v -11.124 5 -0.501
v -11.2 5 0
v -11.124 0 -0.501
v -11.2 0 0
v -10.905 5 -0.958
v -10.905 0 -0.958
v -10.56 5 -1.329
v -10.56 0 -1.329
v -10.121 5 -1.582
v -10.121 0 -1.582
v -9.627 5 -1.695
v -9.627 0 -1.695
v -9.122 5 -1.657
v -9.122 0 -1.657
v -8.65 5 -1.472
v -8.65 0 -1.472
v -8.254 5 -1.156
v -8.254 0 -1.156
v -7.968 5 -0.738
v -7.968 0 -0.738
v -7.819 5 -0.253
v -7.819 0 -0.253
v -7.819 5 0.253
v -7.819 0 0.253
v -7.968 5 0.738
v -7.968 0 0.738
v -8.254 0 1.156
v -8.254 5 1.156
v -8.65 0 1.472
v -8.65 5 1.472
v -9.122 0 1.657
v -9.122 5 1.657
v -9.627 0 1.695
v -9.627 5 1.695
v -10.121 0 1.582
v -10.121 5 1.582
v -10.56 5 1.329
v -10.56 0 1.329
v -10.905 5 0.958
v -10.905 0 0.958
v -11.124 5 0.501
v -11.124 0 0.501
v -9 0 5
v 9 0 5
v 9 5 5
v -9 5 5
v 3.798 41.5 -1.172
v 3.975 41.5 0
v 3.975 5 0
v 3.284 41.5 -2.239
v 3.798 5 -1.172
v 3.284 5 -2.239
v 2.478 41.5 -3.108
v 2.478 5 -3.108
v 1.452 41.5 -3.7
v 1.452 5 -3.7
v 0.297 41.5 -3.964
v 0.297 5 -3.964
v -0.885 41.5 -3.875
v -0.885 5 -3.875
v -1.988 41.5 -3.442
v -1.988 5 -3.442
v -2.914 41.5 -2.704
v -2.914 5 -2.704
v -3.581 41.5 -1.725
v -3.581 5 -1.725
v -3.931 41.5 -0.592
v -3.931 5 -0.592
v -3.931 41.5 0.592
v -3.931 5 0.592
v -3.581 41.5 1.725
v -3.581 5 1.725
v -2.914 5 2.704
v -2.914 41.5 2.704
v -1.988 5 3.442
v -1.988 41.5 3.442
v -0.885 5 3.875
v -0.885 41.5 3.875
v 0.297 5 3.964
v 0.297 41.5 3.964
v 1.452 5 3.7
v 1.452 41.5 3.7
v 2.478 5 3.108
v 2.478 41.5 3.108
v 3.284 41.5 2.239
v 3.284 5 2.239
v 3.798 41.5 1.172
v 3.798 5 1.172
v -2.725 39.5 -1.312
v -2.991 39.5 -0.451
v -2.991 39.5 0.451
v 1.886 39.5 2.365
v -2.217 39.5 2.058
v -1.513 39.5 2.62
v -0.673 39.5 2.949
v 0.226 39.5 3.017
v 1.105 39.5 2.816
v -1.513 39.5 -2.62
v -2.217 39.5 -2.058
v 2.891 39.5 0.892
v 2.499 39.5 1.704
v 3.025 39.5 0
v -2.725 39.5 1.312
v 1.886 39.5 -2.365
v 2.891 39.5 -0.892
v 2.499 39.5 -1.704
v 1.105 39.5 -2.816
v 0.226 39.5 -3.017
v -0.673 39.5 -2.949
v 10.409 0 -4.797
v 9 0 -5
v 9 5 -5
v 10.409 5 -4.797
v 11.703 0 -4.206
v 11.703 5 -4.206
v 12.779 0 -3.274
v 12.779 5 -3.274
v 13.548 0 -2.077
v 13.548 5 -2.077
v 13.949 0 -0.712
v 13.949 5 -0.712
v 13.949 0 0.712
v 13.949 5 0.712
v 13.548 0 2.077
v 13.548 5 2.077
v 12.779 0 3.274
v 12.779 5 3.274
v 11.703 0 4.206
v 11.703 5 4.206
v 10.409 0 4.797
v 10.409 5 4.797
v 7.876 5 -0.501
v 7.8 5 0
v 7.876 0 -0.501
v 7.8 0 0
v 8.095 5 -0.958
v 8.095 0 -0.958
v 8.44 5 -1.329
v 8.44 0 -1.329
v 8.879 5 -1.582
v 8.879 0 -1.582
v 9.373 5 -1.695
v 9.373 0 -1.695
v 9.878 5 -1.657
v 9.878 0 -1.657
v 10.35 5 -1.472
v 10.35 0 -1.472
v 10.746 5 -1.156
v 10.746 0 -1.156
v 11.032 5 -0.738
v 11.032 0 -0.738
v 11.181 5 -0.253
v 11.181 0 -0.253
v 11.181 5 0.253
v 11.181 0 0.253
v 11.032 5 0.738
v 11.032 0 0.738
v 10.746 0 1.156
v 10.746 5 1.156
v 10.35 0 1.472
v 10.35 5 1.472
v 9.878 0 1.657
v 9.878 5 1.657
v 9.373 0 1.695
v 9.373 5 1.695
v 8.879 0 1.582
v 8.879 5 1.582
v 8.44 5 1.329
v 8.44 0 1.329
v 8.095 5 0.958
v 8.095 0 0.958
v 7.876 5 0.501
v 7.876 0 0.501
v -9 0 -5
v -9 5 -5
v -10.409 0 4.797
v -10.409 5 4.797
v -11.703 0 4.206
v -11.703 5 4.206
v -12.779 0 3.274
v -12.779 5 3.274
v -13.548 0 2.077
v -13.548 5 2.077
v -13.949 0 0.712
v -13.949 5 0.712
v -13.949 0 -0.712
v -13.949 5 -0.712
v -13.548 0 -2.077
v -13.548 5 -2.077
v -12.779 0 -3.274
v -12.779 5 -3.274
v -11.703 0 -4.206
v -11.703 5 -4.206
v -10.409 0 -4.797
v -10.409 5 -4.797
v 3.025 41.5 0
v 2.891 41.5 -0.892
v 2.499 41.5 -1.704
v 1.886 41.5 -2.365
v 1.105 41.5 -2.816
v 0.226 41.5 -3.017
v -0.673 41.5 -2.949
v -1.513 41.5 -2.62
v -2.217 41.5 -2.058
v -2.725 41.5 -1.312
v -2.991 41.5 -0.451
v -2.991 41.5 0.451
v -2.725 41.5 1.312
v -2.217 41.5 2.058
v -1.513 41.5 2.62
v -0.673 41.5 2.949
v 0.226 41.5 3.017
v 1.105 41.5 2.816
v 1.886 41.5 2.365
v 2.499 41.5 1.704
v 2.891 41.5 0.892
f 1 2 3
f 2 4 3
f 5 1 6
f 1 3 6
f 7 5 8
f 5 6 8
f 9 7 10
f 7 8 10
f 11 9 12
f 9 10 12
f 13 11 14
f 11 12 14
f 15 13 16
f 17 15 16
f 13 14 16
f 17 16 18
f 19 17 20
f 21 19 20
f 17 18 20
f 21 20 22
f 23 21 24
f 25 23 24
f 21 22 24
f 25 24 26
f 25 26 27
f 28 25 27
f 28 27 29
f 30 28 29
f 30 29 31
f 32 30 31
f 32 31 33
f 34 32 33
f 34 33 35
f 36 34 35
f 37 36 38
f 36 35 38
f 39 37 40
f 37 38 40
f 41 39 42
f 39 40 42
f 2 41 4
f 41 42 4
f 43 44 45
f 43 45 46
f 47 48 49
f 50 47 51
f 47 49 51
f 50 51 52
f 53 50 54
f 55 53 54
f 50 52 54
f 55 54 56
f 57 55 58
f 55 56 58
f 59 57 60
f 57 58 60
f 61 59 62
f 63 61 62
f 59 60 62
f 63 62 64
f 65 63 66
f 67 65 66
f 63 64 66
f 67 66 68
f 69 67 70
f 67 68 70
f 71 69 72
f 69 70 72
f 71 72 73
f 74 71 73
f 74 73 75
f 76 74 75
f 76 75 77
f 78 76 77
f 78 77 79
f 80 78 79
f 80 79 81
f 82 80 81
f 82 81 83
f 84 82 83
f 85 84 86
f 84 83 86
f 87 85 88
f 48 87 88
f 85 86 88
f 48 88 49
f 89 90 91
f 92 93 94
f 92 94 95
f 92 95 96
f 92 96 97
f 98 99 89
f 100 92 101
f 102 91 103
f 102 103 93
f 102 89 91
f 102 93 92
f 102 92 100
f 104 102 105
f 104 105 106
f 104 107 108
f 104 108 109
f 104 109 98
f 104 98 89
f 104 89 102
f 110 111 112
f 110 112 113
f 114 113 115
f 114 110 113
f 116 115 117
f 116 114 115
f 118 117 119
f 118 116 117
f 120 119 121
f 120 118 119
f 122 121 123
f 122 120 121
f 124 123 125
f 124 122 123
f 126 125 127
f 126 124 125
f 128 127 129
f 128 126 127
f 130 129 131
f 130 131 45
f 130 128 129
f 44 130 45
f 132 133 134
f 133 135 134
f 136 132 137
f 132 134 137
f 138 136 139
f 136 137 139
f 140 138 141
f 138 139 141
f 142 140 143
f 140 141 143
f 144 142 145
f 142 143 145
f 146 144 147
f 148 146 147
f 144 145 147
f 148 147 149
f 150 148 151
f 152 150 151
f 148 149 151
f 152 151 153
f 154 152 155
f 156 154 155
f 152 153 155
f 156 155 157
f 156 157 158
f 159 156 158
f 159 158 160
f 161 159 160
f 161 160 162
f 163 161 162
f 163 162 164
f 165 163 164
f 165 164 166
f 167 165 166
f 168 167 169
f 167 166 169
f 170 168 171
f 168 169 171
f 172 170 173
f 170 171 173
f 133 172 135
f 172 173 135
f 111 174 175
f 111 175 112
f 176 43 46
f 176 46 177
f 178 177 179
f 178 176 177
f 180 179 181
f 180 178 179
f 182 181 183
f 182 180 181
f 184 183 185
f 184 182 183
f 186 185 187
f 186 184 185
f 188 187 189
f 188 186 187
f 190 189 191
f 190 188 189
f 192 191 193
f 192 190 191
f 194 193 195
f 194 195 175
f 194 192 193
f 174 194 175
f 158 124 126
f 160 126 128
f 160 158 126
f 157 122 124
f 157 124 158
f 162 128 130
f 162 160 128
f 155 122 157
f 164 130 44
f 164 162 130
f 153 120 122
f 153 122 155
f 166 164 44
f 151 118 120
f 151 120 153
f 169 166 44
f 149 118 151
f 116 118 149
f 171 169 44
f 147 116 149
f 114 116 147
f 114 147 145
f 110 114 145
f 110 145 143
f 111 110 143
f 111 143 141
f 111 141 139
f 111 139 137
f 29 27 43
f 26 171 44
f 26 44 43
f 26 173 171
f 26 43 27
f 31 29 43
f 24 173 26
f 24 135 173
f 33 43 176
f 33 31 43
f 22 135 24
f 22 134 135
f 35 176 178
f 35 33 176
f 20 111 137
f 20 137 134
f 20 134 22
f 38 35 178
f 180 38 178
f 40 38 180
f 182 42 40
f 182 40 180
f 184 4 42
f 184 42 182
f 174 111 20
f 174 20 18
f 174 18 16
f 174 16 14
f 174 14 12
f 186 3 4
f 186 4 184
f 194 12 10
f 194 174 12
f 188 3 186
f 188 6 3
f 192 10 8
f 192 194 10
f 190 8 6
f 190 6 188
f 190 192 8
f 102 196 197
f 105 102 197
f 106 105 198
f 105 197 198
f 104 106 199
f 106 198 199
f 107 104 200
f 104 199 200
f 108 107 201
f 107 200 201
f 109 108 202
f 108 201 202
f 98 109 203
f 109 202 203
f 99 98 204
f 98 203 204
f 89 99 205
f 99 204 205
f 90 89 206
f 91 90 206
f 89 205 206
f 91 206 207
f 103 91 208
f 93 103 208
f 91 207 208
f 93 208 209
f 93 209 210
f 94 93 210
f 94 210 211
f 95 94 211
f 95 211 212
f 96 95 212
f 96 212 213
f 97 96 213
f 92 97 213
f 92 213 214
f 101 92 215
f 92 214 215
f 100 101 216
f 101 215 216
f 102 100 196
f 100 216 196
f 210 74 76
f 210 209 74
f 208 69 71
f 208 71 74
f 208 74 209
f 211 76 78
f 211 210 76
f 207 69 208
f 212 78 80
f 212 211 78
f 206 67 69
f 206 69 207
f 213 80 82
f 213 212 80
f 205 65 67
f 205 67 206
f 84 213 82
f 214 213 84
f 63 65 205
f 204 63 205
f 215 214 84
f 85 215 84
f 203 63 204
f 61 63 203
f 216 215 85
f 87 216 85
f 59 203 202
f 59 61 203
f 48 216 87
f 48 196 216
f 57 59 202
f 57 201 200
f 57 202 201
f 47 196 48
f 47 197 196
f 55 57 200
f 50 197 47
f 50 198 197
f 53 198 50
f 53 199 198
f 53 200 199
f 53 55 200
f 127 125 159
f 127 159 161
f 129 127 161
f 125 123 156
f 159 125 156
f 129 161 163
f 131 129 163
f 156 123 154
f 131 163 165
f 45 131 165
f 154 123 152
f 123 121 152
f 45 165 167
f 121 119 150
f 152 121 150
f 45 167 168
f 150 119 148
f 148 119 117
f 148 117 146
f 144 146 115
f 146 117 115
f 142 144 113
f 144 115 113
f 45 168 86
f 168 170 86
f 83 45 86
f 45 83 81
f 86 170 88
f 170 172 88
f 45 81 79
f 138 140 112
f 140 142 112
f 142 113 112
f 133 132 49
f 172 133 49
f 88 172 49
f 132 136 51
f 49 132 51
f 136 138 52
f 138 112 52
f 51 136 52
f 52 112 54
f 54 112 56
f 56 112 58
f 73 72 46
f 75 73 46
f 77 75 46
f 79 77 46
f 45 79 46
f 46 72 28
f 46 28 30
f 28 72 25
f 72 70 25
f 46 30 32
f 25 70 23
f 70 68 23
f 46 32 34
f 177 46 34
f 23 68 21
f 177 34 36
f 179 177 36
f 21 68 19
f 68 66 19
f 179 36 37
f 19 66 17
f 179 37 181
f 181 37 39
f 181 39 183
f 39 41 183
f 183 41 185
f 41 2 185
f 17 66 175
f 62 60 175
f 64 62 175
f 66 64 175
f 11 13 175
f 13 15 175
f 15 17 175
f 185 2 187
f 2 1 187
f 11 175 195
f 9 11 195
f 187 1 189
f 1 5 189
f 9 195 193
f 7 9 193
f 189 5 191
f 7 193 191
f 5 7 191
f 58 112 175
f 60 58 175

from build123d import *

# Parameters (mm, degrees)
BOSS_EXTRUDE1_DEPTH      = 5
M3_CLEARANCE_HOLE1_D     = 3.4
M3_CLEARANCE_HOLE1_DEPTH = 5
M3_CLEARANCE_HOLE1_TIP   = 1.021463052
SKETCH4_R                = 3.975
BOSS_EXTRUDE2_DEPTH      = 36.5
SKETCH5_R                = 3.025
CUT_EXTRUDE1_DEPTH       = 2


with BuildPart() as part:
    # Sketch1 → Boss-Extrude1 (new body)
    with BuildSketch(Plane(origin=(0, 0, 0), x_dir=(1, 0, 0), z_dir=(0, 1, 0))):
        with BuildLine():
            Line((-9, 5), (9, 5))
            ThreePointArc((9, 5), (14, 0), (9, -5))
            Line((9, -5), (-9, -5))
            ThreePointArc((-9, -5), (-14, 0), (-9, 5))
        make_face()
    extrude(amount=BOSS_EXTRUDE1_DEPTH)

    # M3 Clearance Hole1
    with Locations(Plane(origin=(0, 5, 0), x_dir=(1, 0, 0), z_dir=(0, 1, 0))):
        with Locations((-9.5, 0), (9.5, 0)):
            Hole(M3_CLEARANCE_HOLE1_D / 2, depth=M3_CLEARANCE_HOLE1_DEPTH)
            with Locations((0, 0, -(M3_CLEARANCE_HOLE1_DEPTH + M3_CLEARANCE_HOLE1_TIP / 2))):  # 118° drill point
                Cone(0, M3_CLEARANCE_HOLE1_D / 2, M3_CLEARANCE_HOLE1_TIP, mode=Mode.SUBTRACT)

    # Sketch4 → Boss-Extrude2 (add)
    with BuildSketch(Plane(origin=(0, 5, 0), x_dir=(1, 0, 0), z_dir=(0, 1, 0))):
        Circle(SKETCH4_R)
    extrude(amount=BOSS_EXTRUDE2_DEPTH)

    # Sketch5 → Cut-Extrude1 (cut)
    with BuildSketch(Plane(origin=(0, 41.5, 0), x_dir=(1, 0, 0), z_dir=(0, 1, 0))):
        Circle(SKETCH5_R)
    extrude(amount=-CUT_EXTRUDE1_DEPTH, mode=Mode.SUBTRACT)


solid = part.part
